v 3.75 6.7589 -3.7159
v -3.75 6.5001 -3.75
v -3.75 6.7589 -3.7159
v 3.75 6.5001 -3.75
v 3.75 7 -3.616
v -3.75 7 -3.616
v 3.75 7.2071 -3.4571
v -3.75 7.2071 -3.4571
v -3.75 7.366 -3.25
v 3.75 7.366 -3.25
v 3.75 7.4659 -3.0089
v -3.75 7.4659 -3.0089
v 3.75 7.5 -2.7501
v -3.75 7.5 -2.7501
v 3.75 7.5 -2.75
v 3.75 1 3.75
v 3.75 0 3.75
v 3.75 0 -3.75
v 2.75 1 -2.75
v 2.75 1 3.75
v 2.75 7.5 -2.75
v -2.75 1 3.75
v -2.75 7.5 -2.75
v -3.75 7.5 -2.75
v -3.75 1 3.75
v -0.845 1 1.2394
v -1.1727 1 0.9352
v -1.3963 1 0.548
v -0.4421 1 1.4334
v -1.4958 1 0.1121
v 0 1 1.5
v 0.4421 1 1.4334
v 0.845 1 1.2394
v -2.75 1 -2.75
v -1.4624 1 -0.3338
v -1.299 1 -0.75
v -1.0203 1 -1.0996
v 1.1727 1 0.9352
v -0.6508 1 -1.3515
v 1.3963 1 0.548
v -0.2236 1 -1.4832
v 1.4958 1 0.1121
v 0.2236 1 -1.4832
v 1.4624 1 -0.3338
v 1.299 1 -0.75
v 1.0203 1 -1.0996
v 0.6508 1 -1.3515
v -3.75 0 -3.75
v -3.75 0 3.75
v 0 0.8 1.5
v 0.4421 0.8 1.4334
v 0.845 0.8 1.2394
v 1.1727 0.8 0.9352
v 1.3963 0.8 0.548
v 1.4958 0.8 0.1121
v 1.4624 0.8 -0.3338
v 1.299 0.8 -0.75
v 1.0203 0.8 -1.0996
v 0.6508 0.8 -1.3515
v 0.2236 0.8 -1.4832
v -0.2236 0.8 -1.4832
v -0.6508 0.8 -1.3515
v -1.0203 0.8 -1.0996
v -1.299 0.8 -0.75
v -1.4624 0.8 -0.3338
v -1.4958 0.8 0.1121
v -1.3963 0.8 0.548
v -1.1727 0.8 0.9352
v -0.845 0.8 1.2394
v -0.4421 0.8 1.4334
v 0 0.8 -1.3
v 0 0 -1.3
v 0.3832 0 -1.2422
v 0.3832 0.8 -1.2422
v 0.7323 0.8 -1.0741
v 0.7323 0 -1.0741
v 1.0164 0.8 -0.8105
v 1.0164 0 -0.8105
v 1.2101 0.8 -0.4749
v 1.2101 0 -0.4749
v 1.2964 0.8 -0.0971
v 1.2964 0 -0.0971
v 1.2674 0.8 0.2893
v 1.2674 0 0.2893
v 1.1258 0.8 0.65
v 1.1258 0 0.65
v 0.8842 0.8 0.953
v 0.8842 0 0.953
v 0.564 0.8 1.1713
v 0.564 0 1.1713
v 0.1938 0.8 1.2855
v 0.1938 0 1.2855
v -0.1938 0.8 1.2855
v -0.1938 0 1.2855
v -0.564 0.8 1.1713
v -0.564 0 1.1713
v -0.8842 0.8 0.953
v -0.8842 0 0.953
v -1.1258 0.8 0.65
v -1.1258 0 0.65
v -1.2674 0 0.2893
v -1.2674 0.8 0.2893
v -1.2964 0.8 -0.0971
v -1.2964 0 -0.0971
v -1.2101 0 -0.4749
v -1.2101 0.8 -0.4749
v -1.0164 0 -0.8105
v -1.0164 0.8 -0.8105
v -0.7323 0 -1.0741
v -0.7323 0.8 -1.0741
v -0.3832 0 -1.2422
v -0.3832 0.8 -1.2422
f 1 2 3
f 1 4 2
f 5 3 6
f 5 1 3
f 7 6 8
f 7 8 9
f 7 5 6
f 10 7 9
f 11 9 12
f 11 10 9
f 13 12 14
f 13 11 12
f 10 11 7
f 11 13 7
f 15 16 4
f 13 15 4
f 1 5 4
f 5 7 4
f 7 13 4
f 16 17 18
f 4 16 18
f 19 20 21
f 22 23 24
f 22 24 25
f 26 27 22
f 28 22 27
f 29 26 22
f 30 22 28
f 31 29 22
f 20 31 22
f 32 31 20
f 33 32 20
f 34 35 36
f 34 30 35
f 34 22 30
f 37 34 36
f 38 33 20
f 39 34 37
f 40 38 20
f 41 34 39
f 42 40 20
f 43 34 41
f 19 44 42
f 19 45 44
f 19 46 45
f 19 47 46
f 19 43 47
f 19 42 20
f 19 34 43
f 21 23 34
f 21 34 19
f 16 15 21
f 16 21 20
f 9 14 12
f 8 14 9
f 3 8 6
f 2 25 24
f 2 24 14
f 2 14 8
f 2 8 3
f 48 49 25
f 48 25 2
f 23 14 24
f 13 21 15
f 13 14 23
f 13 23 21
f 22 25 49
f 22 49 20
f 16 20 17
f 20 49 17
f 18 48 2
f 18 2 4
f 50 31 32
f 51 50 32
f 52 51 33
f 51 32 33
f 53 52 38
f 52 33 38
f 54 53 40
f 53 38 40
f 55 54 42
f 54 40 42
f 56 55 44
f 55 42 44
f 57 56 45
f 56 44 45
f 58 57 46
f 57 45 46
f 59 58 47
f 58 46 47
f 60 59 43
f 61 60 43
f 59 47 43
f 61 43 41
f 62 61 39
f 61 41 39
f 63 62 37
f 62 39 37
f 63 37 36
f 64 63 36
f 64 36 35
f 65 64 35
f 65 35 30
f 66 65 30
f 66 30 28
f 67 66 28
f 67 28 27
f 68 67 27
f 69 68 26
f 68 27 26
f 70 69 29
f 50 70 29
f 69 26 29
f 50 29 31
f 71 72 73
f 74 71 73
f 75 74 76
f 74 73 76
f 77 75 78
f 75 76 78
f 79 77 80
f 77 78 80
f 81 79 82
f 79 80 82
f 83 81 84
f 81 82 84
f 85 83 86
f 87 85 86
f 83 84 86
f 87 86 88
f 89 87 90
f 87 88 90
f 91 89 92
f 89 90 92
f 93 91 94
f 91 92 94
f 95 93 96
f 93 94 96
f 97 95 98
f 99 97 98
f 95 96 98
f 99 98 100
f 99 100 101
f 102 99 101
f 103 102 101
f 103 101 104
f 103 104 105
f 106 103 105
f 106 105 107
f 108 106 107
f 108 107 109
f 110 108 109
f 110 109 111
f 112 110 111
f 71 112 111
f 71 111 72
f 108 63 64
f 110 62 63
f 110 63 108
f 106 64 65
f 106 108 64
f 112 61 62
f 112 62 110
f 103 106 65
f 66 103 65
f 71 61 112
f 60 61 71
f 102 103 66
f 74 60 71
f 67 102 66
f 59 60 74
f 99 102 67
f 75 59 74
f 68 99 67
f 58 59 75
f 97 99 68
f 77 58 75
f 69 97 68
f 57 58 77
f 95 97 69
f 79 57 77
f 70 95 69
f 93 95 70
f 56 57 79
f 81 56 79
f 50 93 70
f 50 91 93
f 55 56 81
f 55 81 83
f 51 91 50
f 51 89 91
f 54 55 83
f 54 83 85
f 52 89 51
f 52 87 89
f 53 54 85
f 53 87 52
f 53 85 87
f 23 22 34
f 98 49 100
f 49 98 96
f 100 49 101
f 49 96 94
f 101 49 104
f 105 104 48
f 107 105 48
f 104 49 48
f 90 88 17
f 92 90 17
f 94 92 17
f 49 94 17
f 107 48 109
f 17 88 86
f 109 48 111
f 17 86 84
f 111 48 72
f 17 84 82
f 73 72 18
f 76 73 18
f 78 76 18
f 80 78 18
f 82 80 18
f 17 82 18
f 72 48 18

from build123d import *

# Parameters (mm, degrees)
SKETCH1_W           = 7.5
SKETCH1_H           = 7.5
BOSS_EXTRUDE1_DEPTH = 7.5
SKETCH2_W           = 5.5
SKETCH2_H           = 6.5
CUT_EXTRUDE1_DEPTH  = 6.5
CUT_EXTRUDE2_REACH  = 13.25
SKETCH4_R           = 1.3
CUT_EXTRUDE3_DEPTH  = 1
SKETCH5_R           = 1.5
CUT_EXTRUDE4_DEPTH  = 0.2
FILLET1_R           = 1


with BuildPart() as part:
    # Sketch1 → Boss-Extrude1 (new body)
    with BuildSketch(Plane(origin=(0, 0, 0), x_dir=(1, 0, 0), z_dir=(0, 1, 0))):
        Rectangle(SKETCH1_W, SKETCH1_H)
    extrude(amount=BOSS_EXTRUDE1_DEPTH)

    # Sketch2 → Cut-Extrude1 (cut)
    with BuildSketch(Plane(origin=(0, 7.5, 0), x_dir=(1, 0, 0), z_dir=(0, 1, 0))):
        with Locations((0, -0.5)):
            Rectangle(SKETCH2_W, SKETCH2_H)
    extrude(amount=-CUT_EXTRUDE1_DEPTH, mode=Mode.SUBTRACT)

    # Cut-Extrude2: up to this face of the body (flat: up to its plane)
    cut_extrude2_end = Plane(part.part.faces().sort_by_distance((-3.75, 3.75, 0))[0])
    # Sketch3 → Cut-Extrude2 (cut, up to the picked face)
    with BuildSketch(Plane(origin=(3.75, 0, 0), x_dir=(0, 0, -1), z_dir=(1, 0, 0)), mode=Mode.PRIVATE) as cut_extrude2_sk1:
        Polygon((-3.75, 7.5), (2.75, 7.5), (-3.75, 1), align=None)
    cut_extrude2_tool1 = split(extrude(cut_extrude2_sk1.sketch, amount=-CUT_EXTRUDE2_REACH, mode=Mode.PRIVATE), bisect_by=cut_extrude2_end, keep=Keep.BOTH, mode=Mode.PRIVATE)
    add(cut_extrude2_tool1.solids().sort_by(Axis((3.75, 5.333333, 1.583333), (-1, 0, 0)))[0], mode=Mode.SUBTRACT)

    # Sketch4 → Cut-Extrude3 (cut)
    with BuildSketch(Plane.XZ):
        with Locations(Location((0, 0, 0), (0, 0, 270))):
            Circle(SKETCH4_R)
    extrude(amount=-CUT_EXTRUDE3_DEPTH, mode=Mode.SUBTRACT)

    # Sketch5 → Cut-Extrude4 (cut)
    with BuildSketch(Plane(origin=(0, 1, 0), x_dir=(1, 0, 0), z_dir=(0, 1, 0))):
        with Locations(Location((0, 0, 0), (0, 0, 270))):
            Circle(SKETCH5_R)
    extrude(amount=-CUT_EXTRUDE4_DEPTH, mode=Mode.SUBTRACT)

    # Fillet1
    fillet1_edges = [part.edges().sort_by_distance(p)[0] for p in [
        (0, 7.5, -3.75),
    ]]
    fillet(fillet1_edges, radius=FILLET1_R - 0.0001)  # a hair under: the kernel refuses the full size


solid = part.part
